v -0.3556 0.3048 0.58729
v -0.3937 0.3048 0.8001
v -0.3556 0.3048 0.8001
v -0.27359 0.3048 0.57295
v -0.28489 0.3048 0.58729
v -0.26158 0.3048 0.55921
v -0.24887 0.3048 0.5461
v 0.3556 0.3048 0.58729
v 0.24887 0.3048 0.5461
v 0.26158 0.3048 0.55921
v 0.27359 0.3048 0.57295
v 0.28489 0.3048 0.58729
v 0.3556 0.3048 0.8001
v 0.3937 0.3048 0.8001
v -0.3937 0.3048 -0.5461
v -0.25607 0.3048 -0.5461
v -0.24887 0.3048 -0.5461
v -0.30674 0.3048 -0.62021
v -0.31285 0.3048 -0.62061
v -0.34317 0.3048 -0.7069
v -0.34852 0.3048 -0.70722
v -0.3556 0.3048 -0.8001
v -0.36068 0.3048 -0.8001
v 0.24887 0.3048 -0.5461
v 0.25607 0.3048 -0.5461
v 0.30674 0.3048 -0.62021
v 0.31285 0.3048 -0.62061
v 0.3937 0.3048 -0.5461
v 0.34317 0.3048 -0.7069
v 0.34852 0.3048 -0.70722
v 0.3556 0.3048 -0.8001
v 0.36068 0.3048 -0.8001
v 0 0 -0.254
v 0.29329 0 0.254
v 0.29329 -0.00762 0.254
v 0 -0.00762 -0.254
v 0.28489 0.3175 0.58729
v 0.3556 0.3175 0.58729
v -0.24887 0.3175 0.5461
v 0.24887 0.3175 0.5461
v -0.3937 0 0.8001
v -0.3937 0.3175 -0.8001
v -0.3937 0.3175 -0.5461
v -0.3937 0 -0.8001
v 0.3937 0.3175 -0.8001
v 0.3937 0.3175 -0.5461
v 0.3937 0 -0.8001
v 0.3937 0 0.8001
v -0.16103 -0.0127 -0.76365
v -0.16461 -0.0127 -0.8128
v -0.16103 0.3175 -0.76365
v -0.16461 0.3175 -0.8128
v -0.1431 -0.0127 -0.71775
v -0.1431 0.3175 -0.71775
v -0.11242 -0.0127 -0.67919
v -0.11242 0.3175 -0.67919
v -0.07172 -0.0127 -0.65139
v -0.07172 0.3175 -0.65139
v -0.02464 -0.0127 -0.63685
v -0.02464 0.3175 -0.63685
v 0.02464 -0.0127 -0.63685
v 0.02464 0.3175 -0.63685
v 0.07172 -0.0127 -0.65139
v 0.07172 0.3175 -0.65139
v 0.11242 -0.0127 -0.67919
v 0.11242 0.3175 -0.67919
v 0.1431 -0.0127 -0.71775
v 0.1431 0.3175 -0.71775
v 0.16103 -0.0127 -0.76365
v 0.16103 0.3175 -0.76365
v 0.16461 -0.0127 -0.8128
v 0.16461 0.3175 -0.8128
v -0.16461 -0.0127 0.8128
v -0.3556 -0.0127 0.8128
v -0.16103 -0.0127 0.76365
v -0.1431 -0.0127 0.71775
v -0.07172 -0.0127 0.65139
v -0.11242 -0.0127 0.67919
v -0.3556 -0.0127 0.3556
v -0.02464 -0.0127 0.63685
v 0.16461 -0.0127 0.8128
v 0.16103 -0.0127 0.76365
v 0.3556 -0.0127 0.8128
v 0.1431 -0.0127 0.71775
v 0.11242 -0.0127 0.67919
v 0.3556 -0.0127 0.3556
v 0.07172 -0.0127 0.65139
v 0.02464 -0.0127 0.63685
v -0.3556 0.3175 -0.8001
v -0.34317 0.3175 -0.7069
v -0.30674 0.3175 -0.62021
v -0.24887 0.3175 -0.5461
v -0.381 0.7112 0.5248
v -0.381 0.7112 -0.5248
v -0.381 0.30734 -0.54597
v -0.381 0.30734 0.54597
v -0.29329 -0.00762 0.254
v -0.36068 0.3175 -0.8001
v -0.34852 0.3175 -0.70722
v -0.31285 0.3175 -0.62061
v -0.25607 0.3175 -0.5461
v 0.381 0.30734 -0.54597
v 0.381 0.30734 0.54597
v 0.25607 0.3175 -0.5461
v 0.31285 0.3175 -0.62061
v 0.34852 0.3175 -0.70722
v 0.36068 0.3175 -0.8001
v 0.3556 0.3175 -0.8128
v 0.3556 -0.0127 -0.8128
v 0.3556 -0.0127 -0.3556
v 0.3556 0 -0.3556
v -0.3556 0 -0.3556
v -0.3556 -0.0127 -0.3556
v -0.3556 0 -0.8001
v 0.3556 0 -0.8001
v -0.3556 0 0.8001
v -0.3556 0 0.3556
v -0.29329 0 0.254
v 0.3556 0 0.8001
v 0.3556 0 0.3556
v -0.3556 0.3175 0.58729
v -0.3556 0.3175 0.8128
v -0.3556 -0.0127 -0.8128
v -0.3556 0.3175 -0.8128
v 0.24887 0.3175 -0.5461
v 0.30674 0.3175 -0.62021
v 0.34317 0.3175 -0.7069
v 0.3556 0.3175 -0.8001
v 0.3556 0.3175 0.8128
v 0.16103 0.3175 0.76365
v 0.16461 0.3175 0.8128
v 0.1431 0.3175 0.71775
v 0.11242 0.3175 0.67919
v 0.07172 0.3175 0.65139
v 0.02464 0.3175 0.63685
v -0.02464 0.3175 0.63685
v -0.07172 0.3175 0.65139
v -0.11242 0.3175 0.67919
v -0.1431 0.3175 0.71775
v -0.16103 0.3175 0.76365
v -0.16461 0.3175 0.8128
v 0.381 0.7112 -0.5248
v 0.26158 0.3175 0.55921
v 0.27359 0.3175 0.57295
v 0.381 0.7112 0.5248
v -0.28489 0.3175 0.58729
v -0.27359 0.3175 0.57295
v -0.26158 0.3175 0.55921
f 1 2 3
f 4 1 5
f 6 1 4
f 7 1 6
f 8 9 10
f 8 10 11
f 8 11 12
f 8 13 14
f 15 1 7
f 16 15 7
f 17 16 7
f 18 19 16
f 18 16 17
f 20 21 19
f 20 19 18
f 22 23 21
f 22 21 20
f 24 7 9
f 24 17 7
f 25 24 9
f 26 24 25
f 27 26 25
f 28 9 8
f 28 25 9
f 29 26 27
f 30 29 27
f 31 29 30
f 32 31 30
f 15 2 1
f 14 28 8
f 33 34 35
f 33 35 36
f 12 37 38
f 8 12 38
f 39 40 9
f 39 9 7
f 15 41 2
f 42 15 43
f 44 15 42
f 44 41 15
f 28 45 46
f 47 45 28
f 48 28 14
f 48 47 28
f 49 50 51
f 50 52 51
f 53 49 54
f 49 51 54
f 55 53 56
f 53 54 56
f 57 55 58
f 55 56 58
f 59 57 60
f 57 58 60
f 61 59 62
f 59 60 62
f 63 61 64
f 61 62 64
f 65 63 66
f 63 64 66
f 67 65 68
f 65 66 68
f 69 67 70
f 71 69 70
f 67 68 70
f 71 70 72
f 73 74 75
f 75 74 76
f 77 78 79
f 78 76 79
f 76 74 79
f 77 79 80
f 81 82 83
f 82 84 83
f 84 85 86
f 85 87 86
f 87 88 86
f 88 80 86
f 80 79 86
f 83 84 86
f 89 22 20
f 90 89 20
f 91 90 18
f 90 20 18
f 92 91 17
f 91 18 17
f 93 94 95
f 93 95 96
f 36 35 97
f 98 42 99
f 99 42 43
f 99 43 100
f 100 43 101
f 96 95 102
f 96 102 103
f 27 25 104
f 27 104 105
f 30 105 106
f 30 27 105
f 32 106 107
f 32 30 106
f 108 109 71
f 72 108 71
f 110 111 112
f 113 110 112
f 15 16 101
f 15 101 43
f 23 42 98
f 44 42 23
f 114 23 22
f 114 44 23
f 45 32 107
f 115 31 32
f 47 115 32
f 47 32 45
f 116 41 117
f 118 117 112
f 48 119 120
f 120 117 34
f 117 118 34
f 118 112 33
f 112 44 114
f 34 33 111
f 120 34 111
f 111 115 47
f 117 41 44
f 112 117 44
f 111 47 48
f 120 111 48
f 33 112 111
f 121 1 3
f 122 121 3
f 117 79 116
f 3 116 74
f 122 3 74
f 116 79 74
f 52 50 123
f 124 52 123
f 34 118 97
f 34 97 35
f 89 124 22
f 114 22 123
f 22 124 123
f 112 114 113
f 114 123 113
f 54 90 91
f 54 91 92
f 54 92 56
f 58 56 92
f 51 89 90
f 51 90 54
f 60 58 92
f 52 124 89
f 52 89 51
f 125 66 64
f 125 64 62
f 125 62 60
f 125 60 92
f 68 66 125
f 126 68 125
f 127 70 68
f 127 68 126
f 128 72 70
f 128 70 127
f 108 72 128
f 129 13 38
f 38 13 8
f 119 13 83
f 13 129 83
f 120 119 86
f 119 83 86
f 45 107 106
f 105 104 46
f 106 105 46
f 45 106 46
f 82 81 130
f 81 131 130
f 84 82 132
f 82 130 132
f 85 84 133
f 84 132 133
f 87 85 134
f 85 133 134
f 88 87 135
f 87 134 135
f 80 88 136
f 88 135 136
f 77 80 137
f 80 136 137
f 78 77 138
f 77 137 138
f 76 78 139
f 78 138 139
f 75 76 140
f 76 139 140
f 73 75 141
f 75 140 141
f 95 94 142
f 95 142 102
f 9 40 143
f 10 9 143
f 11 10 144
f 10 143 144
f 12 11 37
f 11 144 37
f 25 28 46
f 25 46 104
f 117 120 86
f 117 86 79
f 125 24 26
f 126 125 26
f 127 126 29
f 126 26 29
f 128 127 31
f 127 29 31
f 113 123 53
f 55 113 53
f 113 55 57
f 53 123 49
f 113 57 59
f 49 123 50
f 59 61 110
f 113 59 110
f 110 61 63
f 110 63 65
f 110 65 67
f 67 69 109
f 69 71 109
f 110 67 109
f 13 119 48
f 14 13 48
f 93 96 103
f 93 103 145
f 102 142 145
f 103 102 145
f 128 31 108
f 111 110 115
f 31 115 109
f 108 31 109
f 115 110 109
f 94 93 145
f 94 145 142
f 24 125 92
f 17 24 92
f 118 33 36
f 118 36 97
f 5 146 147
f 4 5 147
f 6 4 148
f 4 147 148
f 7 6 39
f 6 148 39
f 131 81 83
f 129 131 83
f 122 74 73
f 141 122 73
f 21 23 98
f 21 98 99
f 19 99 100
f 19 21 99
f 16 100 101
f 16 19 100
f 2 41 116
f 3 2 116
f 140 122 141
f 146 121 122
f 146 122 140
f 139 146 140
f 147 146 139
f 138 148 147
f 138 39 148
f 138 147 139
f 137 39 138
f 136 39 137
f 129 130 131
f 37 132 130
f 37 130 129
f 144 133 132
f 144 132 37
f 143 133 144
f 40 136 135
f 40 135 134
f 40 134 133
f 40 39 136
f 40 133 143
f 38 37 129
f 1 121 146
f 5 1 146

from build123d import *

# Parameters (mm, degrees)
BOSS_EXTRUDE1_DEPTH   = 0.3048
BOSS_EXTRUDE1_START   = -0.0127
BOSS_EXTRUDE1_2_DEPTH = 0.3302
BOSS_EXTRUDE1_3_DEPTH = 0.0127
SKETCH2_W             = 0.7112
SKETCH2_H             = 0.0127
CUT_EXTRUDE1_DEPTH    = 0.7112
SKETCH3_W             = 0.7112
SKETCH3_H             = 0.0127
CUT_EXTRUDE2_DEPTH    = 1.0922
BOSS_EXTRUDE2_DEPTH   = 0.0127
BOSS_EXTRUDE3_DEPTH   = 0.0127
CUT_EXTRUDE3_DEPTH    = 0.0127
CUT_EXTRUDE4_DEPTH    = 0.0127
BOSS_EXTRUDE4_DEPTH   = 0.00762
HOLE1_D               = 0.3302
BOSS_EXTRUDE5_DEPTH   = 0.762


with BuildPart() as part:
    # Boss-Extrude1: read off the stored shape, not the designer's step
    # Boss-Extrude1 outline → Boss-Extrude1 (new body)
    with BuildSketch(Plane(origin=(0, 0, 0), x_dir=(1, 0, 0), z_dir=(0, 1, 0))):
        Polygon((-0.3937, -0.8001), (-0.3556, -0.8001), (-0.3556, -0.8128), (0.3556, -0.8128), (0.3556, -0.8001), (0.3937, -0.8001), (0.3937, 0.8001), (0.3556, 0.8001), (0.3556, 0.8128), (-0.3556, 0.8128), (-0.3556, 0.8001), (-0.3937, 0.8001), align=None)
    extrude(amount=BOSS_EXTRUDE1_DEPTH)

    # Boss-Extrude1 2 outline → Boss-Extrude1 2 (add)
    with BuildSketch(Plane(origin=(0, 0, 0), x_dir=(1, 0, 0), z_dir=(0, 1, 0)).offset(BOSS_EXTRUDE1_START)):
        with BuildLine():
            Line((-0.3556, 0.8128), (-0.3556, 0.8001))
            ThreePointArc((-0.3556, 0.8001), (-0.327832943, 0.662343252), (-0.248868158, 0.5461))
            Line((-0.248868158, 0.5461), (-0.3556, 0.5461))
            Line((-0.3556, 0.5461), (-0.3556, -0.8128))
            Line((-0.3556, -0.8128), (0.3556, -0.8128))
            Line((0.3556, -0.8128), (0.3556, 0.5461))
            Line((0.3556, 0.5461), (0.248868158, 0.5461))
            ThreePointArc((0.248868158, 0.5461), (0.327832943, 0.662343252), (0.3556, 0.8001))
            Line((0.3556, 0.8001), (0.3556, 0.8128))
            Line((0.3556, 0.8128), (-0.3556, 0.8128))
        make_face()
    extrude(amount=BOSS_EXTRUDE1_2_DEPTH)

    # Boss-Extrude1 3 outline → Boss-Extrude1 3 (add)
    with BuildSketch(Plane(origin=(0, 0, 0), x_dir=(1, 0, 0), z_dir=(0, 1, 0)).offset(BOSS_EXTRUDE1_START)):
        with BuildLine():
            ThreePointArc((-0.248868158, 0.5461), (-0.327832943, 0.662343252), (-0.3556, 0.8001))
            Line((-0.3556, 0.8001), (-0.3556, 0.5461))
            Line((-0.3556, 0.5461), (-0.248868158, 0.5461))
        make_face()
        with BuildLine():
            Line((0.3556, 0.5461), (0.3556, 0.8001))
            ThreePointArc((0.3556, 0.8001), (0.327832943, 0.662343252), (0.248868158, 0.5461))
            Line((0.248868158, 0.5461), (0.3556, 0.5461))
        make_face()
    extrude(amount=BOSS_EXTRUDE1_3_DEPTH)

    # Sketch2 → Cut-Extrude1 (cut)
    with BuildSketch(Plane(origin=(0, 0, -0.3556), x_dir=(-1, 0, 0), z_dir=(0, 0, -1))):
        with Locations((0, -0.00635)):
            Rectangle(SKETCH2_W, SKETCH2_H)
    extrude(amount=-CUT_EXTRUDE1_DEPTH, mode=Mode.SUBTRACT)

    # Sketch3 → Cut-Extrude2 (cut)
    with BuildSketch(Plane(origin=(0, 0, -0.5461), x_dir=(-1, 0, 0), z_dir=(0, 0, -1))):
        with Locations((0, 0.31115)):
            Rectangle(SKETCH3_W, SKETCH3_H)
    extrude(amount=-CUT_EXTRUDE2_DEPTH, mode=Mode.SUBTRACT)

    # Sketch4 → Boss-Extrude2 (add)
    with BuildSketch(Plane(origin=(0, 0.3048, 0), x_dir=(-1, 0, 0), z_dir=(0, 1, 0))):
        with BuildLine():
            Line((-0.3937, -0.5461), (-0.25607433, -0.5461))
            ThreePointArc((-0.25607433, -0.5461), (-0.333504836, -0.662751587), (-0.36068, -0.8001))
            Line((-0.36068, -0.8001), (-0.3937, -0.8001))
            Line((-0.3937, -0.8001), (-0.3937, -0.5461))
        make_face()
    extrude(amount=BOSS_EXTRUDE2_DEPTH)

    # Sketch5 → Boss-Extrude3 (add)
    with BuildSketch(Plane(origin=(0, 0.3048, 0), x_dir=(-1, 0, 0), z_dir=(0, 1, 0))):
        with BuildLine():
            Line((0.25607433, -0.5461), (0.3937, -0.5461))
            Line((0.3937, -0.5461), (0.3937, -0.8001))
            Line((0.3937, -0.8001), (0.36068, -0.8001))
            ThreePointArc((0.36068, -0.8001), (0.333504836, -0.662751587), (0.25607433, -0.5461))
        make_face()
    extrude(amount=BOSS_EXTRUDE3_DEPTH)

    # Sketch6 → Cut-Extrude3 (cut)
    with BuildSketch(Plane(origin=(0, 0.3175, 0), x_dir=(-1, 0, 0), z_dir=(0, 1, 0))):
        with BuildLine():
            Line((0.3556, 0.5461), (0.3556, 0.587289823))
            Line((0.3556, 0.587289823), (0.284891538, 0.587289823))
            ThreePointArc((0.284891538, 0.587289823), (0.267673315, 0.566000969), (0.248868158, 0.5461))
            Line((0.248868158, 0.5461), (0.3556, 0.5461))
        make_face()
    extrude(amount=-CUT_EXTRUDE3_DEPTH, mode=Mode.SUBTRACT)

    # Sketch7 → Cut-Extrude4 (cut)
    with BuildSketch(Plane(origin=(0, 0.3175, 0), x_dir=(-1, 0, 0), z_dir=(0, 1, 0))):
        with BuildLine():
            Line((-0.284891538, 0.587289823), (-0.3556, 0.587289823))
            Line((-0.3556, 0.587289823), (-0.3556, 0.5461))
            Line((-0.3556, 0.5461), (-0.248868158, 0.5461))
            ThreePointArc((-0.248868158, 0.5461), (-0.267673315, 0.566000969), (-0.284891538, 0.587289823))
        make_face()
    extrude(amount=-CUT_EXTRUDE4_DEPTH, mode=Mode.SUBTRACT)

    # Sketch8 → Boss-Extrude4 (add)
    with BuildSketch(Plane.XZ):
        Polygon((0, -0.254), (-0.293293937, 0.254), (0.293293937, 0.254), align=None)
    extrude(amount=BOSS_EXTRUDE4_DEPTH)

    # Hole1 (through all)
    with Locations(Plane(origin=(0, -0.0127, 0), x_dir=(-1, 0, 0), z_dir=(0, -1, 0))):
        with Locations((0, 0.8001), (0, -0.8001)):
            Hole(HOLE1_D / 2)


with BuildPart() as body_2:
    # Sketch15 → Boss-Extrude5 (new body)
    with BuildSketch(Plane.ZY.offset(0.381)):
        Polygon((-0.524801478, 0.7112), (-0.545966884, 0.30734), (0.545966884, 0.30734), (0.524801478, 0.7112), align=None)
    extrude(amount=-BOSS_EXTRUDE5_DEPTH)


solid = Compound([part.part, body_2.part])
